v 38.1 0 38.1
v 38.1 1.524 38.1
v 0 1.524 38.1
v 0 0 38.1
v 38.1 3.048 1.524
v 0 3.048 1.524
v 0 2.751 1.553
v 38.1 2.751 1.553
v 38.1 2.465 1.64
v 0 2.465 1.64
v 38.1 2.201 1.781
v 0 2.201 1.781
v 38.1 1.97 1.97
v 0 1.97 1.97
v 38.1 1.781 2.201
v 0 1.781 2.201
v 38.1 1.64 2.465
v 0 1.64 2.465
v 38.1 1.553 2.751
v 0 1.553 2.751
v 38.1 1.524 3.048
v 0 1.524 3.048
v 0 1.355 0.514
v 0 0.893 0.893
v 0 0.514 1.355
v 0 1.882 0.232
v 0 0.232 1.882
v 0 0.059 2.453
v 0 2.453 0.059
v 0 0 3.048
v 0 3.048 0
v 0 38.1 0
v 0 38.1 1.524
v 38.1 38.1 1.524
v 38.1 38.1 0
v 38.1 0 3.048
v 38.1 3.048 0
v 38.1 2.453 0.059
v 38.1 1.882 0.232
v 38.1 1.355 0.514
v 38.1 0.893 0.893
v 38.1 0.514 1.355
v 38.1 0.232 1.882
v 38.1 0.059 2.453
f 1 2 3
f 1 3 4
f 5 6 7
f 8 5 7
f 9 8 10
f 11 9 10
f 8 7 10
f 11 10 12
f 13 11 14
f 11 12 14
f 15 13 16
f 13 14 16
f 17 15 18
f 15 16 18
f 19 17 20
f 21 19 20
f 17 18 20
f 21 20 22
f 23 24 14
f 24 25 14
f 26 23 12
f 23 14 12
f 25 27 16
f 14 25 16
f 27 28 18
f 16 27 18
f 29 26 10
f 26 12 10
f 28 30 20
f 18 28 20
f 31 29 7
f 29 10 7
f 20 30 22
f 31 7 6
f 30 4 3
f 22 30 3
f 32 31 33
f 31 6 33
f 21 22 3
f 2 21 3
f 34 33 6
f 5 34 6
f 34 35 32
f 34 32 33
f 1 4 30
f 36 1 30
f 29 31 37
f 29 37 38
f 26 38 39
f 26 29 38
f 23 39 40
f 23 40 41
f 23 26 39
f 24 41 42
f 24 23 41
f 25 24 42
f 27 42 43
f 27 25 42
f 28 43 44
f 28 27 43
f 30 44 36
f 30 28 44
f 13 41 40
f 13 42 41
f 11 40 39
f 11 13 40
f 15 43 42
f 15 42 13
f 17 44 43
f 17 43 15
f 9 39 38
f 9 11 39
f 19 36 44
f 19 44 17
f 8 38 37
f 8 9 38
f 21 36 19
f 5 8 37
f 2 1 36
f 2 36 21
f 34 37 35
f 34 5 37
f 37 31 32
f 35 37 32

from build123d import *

# Parameters (mm, degrees)
BOSS_EXTRUDE1_DEPTH    = 38.1
CONVERT_SOLID1_DEPTH   = 38.1
CONVERT_SOLID1_2_DEPTH = 38.1


# Read off the part's stored shape, not the designer's step: Convert-Solid1
with BuildPart() as part:
    # Sketch1 → Boss-Extrude1 (new body)
    with BuildSketch(Plane(origin=(0, 0, 0), x_dir=(0, 0, -1), z_dir=(1, 0, 0))):
        Polygon((-1.524, 38.1), (-1.524, 1.524), (-38.1, 1.524), (-38.1, 0), (0, 0), (0, 38.1), align=None)
    extrude(amount=BOSS_EXTRUDE1_DEPTH)

    # Convert-Solid1 outline → Convert-Solid1 (cut)
    with BuildSketch(Plane.YZ):
        with BuildLine():
            ThreePointArc((3.048, 0), (0.892738531, 0.892738531), (0, 3.048))
            Line((0, 3.048), (0, 0))
            Line((0, 0), (3.048, 0))
        make_face()
    extrude(amount=CONVERT_SOLID1_DEPTH, mode=Mode.SUBTRACT)

    # Convert-Solid1 2 outline → Convert-Solid1 2 (add)
    with BuildSketch(Plane.YZ):
        with BuildLine():
            ThreePointArc((3.048, 1.524), (1.970369265, 1.970369265), (1.524, 3.048))
            Line((1.524, 3.048), (1.524, 1.524))
            Line((1.524, 1.524), (3.048, 1.524))
        make_face()
    extrude(amount=CONVERT_SOLID1_2_DEPTH)


solid = part.part
